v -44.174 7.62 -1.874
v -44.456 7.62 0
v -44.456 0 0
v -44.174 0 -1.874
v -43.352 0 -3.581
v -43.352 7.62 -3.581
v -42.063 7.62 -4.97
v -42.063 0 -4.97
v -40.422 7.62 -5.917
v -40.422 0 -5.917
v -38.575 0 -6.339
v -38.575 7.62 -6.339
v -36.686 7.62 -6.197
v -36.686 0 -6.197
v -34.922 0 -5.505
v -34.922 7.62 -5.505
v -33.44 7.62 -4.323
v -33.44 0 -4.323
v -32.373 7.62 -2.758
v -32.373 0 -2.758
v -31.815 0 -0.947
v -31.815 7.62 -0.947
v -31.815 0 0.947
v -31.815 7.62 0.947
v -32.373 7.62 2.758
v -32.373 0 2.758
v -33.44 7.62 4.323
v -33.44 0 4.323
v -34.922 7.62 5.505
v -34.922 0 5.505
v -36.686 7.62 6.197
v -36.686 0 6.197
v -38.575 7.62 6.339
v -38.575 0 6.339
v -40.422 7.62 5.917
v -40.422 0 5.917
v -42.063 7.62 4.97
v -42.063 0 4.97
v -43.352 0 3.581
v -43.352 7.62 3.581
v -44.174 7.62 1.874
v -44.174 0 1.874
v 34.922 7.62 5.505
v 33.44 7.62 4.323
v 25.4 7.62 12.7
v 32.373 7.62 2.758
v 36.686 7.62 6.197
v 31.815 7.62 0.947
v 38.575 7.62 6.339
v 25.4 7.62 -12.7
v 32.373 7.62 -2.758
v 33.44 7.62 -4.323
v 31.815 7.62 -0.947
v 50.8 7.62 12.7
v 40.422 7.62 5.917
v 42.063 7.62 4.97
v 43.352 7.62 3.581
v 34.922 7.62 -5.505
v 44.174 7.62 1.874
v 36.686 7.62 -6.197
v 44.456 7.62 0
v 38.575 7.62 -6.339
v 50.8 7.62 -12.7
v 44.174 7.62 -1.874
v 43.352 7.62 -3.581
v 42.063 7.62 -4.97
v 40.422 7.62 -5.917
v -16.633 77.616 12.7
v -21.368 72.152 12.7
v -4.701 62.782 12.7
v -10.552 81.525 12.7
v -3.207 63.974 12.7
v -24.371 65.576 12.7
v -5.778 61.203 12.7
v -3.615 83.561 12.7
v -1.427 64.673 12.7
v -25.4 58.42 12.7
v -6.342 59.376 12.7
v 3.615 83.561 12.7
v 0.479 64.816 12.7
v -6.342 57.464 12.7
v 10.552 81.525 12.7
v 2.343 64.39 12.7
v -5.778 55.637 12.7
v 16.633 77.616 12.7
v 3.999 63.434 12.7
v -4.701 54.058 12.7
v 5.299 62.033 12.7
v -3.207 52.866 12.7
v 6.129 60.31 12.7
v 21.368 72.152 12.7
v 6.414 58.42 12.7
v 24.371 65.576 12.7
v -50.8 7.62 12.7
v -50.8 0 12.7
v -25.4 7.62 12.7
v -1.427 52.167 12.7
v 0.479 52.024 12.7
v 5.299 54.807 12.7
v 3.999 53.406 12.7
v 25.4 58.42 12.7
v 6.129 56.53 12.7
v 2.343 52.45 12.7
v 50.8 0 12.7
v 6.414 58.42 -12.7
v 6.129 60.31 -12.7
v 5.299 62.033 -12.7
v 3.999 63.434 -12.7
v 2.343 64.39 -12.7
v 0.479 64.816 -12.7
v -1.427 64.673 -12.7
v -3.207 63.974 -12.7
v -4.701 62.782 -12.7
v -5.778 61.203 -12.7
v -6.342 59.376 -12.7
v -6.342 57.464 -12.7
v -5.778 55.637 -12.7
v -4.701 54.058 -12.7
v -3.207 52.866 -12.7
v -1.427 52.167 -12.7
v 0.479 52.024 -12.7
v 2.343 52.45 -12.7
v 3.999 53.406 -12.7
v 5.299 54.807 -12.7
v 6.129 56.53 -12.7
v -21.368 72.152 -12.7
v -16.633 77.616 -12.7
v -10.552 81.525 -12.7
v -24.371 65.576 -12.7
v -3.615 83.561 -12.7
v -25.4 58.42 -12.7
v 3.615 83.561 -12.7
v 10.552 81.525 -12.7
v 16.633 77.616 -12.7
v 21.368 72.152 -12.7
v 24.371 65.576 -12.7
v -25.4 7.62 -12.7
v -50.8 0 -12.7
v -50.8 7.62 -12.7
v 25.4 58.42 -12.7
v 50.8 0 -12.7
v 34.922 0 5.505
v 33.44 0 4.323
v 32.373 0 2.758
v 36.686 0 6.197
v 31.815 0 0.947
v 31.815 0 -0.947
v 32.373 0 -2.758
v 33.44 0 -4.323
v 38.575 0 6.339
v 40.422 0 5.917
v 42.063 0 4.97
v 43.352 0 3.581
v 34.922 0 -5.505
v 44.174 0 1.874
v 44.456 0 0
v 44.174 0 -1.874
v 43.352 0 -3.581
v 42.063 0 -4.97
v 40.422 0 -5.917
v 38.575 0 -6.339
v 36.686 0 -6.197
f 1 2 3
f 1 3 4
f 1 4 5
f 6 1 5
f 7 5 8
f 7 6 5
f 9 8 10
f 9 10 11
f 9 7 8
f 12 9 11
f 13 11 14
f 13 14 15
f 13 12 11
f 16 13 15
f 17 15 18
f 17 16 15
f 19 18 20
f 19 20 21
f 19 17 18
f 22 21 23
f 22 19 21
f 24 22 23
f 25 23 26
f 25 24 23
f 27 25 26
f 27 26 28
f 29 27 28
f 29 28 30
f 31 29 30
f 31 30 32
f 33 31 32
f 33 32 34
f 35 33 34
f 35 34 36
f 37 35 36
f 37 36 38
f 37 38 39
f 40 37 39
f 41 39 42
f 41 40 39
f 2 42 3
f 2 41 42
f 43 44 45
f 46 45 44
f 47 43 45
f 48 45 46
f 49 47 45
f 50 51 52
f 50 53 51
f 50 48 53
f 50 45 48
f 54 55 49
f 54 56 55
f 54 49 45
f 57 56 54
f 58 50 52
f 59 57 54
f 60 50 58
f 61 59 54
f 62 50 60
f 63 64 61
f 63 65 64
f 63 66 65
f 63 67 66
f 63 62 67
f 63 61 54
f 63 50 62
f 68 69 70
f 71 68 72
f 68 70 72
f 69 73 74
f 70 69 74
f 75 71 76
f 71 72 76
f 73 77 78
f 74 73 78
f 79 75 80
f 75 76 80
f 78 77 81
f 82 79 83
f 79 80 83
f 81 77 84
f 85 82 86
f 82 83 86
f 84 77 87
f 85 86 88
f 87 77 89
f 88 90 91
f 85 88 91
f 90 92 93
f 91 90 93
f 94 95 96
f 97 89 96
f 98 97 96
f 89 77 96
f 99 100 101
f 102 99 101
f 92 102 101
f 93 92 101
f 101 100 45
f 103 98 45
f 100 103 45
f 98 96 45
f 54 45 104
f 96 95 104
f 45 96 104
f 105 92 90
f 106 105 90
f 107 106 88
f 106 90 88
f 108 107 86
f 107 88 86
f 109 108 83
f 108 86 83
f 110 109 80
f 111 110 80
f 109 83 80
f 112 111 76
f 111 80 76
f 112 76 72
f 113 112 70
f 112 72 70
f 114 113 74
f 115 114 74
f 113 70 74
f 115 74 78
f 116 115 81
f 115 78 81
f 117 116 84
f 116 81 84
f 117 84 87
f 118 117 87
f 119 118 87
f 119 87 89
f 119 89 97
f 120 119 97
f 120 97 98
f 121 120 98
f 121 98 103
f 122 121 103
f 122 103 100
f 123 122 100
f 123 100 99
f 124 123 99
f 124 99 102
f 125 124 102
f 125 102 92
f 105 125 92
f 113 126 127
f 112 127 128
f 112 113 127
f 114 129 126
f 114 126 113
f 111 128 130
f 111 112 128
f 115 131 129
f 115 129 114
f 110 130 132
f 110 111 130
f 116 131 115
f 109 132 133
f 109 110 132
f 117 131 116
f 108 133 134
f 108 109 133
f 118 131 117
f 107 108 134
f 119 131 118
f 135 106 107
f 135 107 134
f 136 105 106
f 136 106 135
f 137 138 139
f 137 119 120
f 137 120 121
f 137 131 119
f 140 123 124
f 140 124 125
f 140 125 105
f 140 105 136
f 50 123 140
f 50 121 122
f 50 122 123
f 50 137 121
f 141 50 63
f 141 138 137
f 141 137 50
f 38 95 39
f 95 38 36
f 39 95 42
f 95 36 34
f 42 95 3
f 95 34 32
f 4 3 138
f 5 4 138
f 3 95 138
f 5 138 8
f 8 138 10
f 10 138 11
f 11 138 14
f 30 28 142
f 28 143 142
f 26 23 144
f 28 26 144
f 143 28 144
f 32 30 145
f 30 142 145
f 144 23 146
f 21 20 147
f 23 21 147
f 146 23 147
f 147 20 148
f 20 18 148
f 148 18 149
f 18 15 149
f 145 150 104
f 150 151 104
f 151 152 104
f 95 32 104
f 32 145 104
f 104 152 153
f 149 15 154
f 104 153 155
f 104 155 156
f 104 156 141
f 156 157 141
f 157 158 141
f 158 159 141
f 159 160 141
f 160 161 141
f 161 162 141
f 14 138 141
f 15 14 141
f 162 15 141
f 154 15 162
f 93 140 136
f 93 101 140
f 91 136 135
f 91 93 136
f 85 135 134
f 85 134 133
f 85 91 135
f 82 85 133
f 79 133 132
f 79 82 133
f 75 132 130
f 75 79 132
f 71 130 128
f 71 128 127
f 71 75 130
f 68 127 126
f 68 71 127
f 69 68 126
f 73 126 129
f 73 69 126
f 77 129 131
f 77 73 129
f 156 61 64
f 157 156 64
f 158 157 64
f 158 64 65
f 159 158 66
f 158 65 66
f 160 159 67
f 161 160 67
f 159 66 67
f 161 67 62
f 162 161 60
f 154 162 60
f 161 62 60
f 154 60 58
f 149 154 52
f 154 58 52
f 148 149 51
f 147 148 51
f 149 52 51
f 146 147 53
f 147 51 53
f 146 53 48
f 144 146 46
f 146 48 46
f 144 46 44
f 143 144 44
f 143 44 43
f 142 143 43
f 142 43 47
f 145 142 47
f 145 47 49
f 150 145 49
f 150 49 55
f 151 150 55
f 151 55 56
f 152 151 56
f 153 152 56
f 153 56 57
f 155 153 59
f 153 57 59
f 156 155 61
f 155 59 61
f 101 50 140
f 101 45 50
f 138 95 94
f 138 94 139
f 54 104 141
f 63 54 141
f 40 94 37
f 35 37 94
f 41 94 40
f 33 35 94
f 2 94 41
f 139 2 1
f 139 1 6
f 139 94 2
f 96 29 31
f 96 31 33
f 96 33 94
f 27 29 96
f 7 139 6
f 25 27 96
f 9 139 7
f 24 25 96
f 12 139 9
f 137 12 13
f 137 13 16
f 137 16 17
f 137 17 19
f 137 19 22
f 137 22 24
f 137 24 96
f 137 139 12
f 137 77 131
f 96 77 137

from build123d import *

# Parameters (mm, degrees)
SKETCH2_W           = 101.6
SKETCH2_H           = 25.4
BOSS_EXTRUDE1_DEPTH = 7.62
BOSS_EXTRUDE2_DEPTH = 12.7
SKETCH4_R           = 6.35635
CUT_EXTRUDE1_DEPTH  = 7.62
CUT_EXTRUDE2_REACH  = 27.4
SKETCH5_R           = 6.4135


with BuildPart() as part:
    # Sketch2 → Boss-Extrude1 (new body)
    with BuildSketch(Plane(origin=(0, 0, 0), x_dir=(1, 0, 0), z_dir=(0, 1, 0))):
        Rectangle(SKETCH2_W, SKETCH2_H)
    extrude(amount=BOSS_EXTRUDE1_DEPTH)

    # Sketch3 → Boss-Extrude2 (add, symmetric)
    with BuildSketch(Plane.XY):
        with BuildLine():
            ThreePointArc((25.4, 58.42), (0, 83.82), (-25.4, 58.42))
            Line((-25.4, 58.42), (25.4, 58.42))
        make_face()
        with BuildLine():
            Line((25.4, 58.42), (-25.4, 58.42))
            ThreePointArc((-25.4, 58.42), (0, 33.02), (25.4, 58.42))
        make_face()
        with BuildLine():
            Line((-25.4, 58.42), (-25.4, 7.62))
            Line((-25.4, 7.62), (25.4, 7.62))
            Line((25.4, 7.62), (25.4, 58.42))
            ThreePointArc((25.4, 58.42), (0, 33.02), (-25.4, 58.42))
        make_face()
    extrude(amount=BOSS_EXTRUDE2_DEPTH, both=True)

    # Sketch4 → Cut-Extrude1 (cut)
    with BuildSketch(Plane(origin=(0, 7.62, 0), x_dir=(1, 0, 0), z_dir=(0, 1, 0))):
        with Locations((38.1, 0)):
            Circle(SKETCH4_R)
    cut_extrude1 = extrude(amount=-CUT_EXTRUDE1_DEPTH, mode=Mode.SUBTRACT)

    # Mirror1: Cut-Extrude1 across plane
    add(cut_extrude1.mirror(Plane(origin=(0, 0, 0), x_dir=(0, 0, 1), z_dir=(1, 0, 0))), mode=Mode.SUBTRACT)

    # Sketch5 → Cut-Extrude2 (cut, up to next)
    with BuildSketch(Plane.XY.offset(12.7), mode=Mode.PRIVATE) as cut_extrude2_sk1:
        with Locations((0, 58.42)):
            Circle(SKETCH5_R)
    cut_extrude2_tool1 = extrude(cut_extrude2_sk1.sketch, amount=-CUT_EXTRUDE2_REACH, mode=Mode.PRIVATE) & part.part
    add(cut_extrude2_tool1.solids().sort_by_distance((0, 58.42, 12.7))[0], mode=Mode.SUBTRACT)


solid = part.part
